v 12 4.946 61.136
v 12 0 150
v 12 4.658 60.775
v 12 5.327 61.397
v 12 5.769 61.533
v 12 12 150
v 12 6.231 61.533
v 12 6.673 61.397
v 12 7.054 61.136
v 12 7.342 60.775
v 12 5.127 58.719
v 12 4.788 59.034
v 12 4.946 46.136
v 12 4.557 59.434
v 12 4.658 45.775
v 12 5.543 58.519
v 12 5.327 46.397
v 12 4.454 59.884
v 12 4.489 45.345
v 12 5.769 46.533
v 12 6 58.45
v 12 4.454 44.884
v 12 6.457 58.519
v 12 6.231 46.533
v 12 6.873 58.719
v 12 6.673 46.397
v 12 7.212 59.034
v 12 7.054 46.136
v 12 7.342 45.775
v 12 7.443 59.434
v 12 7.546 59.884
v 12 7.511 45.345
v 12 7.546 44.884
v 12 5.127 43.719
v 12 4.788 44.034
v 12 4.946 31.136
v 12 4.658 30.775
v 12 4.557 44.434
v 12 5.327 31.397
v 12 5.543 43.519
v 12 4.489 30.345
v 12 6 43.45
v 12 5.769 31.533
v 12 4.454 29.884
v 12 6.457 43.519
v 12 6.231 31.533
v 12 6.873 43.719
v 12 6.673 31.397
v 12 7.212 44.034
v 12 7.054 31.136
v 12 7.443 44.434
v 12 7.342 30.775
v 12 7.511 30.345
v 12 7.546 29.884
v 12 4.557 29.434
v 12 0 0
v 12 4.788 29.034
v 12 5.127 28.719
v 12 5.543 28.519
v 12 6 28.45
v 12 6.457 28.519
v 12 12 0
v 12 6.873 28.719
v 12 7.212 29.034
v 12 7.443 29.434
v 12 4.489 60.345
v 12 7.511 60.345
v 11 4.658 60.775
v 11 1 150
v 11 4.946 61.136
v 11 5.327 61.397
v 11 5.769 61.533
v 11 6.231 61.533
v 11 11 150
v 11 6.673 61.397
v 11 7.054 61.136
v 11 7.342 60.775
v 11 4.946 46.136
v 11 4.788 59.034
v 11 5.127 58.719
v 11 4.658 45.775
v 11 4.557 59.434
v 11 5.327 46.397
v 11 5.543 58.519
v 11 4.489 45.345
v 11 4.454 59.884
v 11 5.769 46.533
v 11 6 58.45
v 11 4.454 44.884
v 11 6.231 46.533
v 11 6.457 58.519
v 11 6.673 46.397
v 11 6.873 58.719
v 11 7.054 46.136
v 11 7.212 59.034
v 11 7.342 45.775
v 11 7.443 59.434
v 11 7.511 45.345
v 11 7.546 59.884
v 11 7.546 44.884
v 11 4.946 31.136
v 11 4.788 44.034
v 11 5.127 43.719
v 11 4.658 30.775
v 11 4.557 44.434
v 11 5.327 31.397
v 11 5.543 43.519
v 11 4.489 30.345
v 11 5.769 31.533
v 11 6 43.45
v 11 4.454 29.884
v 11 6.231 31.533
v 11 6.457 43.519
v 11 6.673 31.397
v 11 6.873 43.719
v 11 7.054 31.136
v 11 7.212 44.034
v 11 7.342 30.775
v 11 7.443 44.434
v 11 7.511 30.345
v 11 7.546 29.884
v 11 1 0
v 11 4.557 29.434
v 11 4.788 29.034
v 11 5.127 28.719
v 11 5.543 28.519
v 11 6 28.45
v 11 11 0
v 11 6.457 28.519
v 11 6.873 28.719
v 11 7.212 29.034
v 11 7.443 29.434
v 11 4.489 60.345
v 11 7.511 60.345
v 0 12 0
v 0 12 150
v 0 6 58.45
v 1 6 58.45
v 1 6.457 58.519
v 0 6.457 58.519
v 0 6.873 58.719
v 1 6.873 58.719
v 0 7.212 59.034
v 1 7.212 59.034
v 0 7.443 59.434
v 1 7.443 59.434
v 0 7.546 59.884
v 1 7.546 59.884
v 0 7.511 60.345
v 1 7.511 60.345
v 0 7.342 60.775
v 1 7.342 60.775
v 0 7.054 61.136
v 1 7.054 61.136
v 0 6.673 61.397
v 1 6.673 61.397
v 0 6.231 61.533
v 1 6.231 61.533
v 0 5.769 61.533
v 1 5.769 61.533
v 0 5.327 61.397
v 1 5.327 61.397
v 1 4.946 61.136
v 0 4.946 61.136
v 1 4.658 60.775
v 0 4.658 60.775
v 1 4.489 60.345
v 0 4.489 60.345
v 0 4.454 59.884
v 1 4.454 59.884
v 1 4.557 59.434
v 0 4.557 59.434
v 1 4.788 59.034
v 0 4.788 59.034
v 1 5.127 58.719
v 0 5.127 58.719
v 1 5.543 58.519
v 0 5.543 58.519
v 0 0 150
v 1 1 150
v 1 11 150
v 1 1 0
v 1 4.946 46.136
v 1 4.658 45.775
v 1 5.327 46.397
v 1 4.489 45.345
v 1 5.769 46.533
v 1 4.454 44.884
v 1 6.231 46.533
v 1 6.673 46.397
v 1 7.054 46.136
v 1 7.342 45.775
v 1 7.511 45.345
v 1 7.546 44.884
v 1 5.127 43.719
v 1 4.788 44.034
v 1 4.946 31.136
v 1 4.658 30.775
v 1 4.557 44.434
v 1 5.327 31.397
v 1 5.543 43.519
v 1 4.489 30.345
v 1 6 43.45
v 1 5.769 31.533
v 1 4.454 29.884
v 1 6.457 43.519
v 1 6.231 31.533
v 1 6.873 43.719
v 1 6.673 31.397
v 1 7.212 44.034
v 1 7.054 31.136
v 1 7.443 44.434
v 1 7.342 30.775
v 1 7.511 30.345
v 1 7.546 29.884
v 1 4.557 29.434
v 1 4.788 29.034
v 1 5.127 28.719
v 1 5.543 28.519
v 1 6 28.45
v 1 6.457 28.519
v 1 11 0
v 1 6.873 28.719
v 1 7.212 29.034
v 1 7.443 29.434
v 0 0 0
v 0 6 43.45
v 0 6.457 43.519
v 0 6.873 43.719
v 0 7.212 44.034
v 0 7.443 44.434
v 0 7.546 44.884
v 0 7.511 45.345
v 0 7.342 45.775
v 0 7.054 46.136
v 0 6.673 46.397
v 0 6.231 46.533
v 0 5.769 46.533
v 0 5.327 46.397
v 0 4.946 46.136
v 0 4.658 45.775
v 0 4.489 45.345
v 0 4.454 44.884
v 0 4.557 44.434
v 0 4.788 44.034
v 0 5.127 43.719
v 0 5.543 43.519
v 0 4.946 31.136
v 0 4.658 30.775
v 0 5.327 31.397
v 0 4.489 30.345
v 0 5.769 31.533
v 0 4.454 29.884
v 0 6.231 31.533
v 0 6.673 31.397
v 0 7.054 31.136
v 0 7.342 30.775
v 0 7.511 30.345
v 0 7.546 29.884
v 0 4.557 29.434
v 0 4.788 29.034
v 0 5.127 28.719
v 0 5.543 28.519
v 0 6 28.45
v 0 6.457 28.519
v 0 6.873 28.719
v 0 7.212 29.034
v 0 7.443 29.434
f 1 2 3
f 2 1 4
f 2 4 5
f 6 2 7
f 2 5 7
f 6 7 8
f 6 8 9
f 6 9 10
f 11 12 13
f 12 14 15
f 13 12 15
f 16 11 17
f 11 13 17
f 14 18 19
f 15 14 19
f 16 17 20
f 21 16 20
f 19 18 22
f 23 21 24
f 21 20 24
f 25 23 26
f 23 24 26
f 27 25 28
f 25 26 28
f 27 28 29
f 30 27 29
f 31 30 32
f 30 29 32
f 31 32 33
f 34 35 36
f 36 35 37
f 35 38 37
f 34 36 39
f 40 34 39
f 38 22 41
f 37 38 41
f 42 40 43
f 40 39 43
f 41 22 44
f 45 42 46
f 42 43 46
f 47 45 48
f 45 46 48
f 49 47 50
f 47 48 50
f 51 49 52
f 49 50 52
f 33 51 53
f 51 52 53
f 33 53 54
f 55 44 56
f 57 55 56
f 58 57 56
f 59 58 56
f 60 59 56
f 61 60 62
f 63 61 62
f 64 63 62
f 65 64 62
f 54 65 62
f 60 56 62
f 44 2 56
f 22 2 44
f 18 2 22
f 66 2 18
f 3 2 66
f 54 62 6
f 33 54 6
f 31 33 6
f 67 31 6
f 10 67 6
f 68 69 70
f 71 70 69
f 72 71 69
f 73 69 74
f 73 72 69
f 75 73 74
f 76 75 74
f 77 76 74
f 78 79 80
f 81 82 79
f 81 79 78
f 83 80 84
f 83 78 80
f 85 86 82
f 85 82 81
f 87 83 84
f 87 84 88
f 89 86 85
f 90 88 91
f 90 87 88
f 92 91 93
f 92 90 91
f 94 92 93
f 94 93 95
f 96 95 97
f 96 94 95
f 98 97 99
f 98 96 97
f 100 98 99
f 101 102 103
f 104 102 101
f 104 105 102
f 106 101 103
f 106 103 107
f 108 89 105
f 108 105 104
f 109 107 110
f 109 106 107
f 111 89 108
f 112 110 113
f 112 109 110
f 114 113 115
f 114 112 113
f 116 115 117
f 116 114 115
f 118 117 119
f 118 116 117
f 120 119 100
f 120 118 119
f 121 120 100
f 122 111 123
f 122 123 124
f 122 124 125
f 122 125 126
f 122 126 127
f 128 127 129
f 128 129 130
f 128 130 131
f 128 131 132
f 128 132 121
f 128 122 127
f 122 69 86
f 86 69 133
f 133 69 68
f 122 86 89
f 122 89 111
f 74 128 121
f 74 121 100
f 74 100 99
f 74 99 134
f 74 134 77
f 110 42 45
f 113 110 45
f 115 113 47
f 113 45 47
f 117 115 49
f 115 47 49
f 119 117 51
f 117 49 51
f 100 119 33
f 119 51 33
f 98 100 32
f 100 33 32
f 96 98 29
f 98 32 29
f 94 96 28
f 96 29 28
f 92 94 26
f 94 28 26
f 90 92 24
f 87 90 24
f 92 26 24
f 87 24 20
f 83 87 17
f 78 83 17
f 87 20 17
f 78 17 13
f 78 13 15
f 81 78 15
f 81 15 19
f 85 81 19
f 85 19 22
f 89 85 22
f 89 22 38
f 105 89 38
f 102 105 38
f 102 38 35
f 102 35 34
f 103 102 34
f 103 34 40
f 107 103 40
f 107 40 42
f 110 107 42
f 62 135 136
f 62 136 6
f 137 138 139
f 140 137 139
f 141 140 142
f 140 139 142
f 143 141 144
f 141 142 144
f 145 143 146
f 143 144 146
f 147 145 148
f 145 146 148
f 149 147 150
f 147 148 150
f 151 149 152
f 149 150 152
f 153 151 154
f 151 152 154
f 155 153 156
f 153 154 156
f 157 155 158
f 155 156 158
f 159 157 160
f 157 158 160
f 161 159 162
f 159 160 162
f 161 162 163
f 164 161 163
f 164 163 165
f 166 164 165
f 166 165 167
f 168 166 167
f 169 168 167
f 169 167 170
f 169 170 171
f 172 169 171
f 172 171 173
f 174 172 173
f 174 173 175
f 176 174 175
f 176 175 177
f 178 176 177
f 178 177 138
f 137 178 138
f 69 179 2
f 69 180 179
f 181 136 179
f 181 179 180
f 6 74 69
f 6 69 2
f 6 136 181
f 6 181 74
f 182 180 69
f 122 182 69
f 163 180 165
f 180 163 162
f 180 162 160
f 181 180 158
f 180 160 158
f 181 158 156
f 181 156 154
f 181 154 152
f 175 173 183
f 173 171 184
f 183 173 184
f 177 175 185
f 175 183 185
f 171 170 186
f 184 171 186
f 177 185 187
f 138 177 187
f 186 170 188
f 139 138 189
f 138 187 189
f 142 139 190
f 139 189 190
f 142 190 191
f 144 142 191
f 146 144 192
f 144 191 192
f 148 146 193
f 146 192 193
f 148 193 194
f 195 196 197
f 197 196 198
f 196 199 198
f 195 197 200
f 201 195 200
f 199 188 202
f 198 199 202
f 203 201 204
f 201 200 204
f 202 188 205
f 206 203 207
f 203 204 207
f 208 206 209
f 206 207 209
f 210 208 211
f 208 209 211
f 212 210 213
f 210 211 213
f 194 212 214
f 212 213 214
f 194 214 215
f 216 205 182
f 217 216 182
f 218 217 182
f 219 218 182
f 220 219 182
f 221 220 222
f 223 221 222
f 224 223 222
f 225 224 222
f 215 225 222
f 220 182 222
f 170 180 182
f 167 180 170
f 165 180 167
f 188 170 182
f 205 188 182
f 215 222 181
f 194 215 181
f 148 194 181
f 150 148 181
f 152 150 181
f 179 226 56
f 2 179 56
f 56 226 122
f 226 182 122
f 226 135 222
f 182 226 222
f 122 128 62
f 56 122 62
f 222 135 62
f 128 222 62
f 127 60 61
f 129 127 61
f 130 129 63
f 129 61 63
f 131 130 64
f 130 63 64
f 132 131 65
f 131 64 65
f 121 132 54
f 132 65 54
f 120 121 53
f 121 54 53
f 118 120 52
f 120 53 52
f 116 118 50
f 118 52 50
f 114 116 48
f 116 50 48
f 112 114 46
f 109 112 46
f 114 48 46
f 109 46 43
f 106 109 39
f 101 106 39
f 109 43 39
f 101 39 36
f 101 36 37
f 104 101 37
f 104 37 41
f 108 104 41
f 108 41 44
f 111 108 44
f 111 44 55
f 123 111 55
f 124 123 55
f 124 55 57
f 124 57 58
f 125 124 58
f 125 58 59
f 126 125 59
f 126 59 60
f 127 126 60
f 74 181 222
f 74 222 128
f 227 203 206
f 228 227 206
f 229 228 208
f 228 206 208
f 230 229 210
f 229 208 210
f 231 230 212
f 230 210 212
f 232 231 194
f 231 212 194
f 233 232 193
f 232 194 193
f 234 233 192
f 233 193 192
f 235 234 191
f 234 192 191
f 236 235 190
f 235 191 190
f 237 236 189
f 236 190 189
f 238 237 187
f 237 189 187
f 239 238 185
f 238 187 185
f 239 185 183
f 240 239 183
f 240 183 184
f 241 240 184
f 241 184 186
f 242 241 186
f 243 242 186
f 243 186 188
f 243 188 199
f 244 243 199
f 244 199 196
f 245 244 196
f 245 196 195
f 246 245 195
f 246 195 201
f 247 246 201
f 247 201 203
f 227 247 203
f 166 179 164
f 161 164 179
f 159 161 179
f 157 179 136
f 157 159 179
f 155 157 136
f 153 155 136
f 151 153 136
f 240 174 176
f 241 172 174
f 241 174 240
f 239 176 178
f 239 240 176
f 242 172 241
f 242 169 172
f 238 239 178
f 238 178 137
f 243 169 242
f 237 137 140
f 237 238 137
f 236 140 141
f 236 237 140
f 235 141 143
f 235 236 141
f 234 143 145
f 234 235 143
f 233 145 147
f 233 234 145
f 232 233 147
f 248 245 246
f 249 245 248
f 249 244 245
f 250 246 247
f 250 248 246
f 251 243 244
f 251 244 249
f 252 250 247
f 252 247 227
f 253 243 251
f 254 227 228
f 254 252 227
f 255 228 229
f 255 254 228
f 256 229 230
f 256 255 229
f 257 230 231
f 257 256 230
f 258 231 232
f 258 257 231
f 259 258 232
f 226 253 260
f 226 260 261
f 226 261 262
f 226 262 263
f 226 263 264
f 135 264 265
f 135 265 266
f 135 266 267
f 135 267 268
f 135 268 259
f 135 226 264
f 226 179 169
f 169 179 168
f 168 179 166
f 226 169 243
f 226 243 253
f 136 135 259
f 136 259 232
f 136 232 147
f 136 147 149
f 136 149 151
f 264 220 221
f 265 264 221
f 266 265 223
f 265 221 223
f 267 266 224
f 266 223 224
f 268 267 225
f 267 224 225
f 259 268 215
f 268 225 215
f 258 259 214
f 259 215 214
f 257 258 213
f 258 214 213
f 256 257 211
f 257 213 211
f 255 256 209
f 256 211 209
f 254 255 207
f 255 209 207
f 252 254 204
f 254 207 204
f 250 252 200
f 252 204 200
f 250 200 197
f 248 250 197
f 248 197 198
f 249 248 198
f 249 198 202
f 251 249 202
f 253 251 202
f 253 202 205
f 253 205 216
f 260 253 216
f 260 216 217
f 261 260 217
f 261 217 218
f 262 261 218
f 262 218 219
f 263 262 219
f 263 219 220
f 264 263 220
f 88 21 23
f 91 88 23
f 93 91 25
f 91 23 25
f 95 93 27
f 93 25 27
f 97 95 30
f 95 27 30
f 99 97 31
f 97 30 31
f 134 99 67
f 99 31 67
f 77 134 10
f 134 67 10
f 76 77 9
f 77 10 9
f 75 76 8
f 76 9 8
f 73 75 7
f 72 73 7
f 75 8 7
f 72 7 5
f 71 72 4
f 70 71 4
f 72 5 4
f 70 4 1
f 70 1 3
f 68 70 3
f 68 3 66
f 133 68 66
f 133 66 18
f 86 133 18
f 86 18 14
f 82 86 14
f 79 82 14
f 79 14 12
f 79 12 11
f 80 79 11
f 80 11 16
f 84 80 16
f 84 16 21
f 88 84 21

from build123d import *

# Parameters (mm, degrees)
SKETCH_1_W          = 12
SKETCH_1_H          = 12
SKETCH_1_W_2        = 10
SKETCH_1_H_2        = 10
EXTRUDE_1_DEPTH     = 150
SKETCH_3_R          = 1.55
CUT_EXTRUDE_1_DEPTH = 151.956947505


with BuildPart() as part:
    # 草图1 → 凸台-拉伸1 (new body)
    with BuildSketch(Plane.XY):
        with Locations((6, 6)):
            Rectangle(SKETCH_1_W, SKETCH_1_H)
        with Locations((6, 6)):
            Rectangle(SKETCH_1_W_2, SKETCH_1_H_2, mode=Mode.SUBTRACT)
    extrude(amount=EXTRUDE_1_DEPTH)

    # 草图3 → 切除-拉伸1 (cut, through all)
    with BuildSketch(Plane.YZ.offset(12)):
        with Locations(Location((6, 30, 0), (0, 0, 270))):
            Circle(SKETCH_3_R)
        with Locations(Location((6, 45, 0), (0, 0, 270))):
            Circle(SKETCH_3_R)
        with Locations(Location((6, 60, 0), (0, 0, 270))):
            Circle(SKETCH_3_R)
    extrude(amount=-CUT_EXTRUDE_1_DEPTH, mode=Mode.SUBTRACT)


solid = part.part
